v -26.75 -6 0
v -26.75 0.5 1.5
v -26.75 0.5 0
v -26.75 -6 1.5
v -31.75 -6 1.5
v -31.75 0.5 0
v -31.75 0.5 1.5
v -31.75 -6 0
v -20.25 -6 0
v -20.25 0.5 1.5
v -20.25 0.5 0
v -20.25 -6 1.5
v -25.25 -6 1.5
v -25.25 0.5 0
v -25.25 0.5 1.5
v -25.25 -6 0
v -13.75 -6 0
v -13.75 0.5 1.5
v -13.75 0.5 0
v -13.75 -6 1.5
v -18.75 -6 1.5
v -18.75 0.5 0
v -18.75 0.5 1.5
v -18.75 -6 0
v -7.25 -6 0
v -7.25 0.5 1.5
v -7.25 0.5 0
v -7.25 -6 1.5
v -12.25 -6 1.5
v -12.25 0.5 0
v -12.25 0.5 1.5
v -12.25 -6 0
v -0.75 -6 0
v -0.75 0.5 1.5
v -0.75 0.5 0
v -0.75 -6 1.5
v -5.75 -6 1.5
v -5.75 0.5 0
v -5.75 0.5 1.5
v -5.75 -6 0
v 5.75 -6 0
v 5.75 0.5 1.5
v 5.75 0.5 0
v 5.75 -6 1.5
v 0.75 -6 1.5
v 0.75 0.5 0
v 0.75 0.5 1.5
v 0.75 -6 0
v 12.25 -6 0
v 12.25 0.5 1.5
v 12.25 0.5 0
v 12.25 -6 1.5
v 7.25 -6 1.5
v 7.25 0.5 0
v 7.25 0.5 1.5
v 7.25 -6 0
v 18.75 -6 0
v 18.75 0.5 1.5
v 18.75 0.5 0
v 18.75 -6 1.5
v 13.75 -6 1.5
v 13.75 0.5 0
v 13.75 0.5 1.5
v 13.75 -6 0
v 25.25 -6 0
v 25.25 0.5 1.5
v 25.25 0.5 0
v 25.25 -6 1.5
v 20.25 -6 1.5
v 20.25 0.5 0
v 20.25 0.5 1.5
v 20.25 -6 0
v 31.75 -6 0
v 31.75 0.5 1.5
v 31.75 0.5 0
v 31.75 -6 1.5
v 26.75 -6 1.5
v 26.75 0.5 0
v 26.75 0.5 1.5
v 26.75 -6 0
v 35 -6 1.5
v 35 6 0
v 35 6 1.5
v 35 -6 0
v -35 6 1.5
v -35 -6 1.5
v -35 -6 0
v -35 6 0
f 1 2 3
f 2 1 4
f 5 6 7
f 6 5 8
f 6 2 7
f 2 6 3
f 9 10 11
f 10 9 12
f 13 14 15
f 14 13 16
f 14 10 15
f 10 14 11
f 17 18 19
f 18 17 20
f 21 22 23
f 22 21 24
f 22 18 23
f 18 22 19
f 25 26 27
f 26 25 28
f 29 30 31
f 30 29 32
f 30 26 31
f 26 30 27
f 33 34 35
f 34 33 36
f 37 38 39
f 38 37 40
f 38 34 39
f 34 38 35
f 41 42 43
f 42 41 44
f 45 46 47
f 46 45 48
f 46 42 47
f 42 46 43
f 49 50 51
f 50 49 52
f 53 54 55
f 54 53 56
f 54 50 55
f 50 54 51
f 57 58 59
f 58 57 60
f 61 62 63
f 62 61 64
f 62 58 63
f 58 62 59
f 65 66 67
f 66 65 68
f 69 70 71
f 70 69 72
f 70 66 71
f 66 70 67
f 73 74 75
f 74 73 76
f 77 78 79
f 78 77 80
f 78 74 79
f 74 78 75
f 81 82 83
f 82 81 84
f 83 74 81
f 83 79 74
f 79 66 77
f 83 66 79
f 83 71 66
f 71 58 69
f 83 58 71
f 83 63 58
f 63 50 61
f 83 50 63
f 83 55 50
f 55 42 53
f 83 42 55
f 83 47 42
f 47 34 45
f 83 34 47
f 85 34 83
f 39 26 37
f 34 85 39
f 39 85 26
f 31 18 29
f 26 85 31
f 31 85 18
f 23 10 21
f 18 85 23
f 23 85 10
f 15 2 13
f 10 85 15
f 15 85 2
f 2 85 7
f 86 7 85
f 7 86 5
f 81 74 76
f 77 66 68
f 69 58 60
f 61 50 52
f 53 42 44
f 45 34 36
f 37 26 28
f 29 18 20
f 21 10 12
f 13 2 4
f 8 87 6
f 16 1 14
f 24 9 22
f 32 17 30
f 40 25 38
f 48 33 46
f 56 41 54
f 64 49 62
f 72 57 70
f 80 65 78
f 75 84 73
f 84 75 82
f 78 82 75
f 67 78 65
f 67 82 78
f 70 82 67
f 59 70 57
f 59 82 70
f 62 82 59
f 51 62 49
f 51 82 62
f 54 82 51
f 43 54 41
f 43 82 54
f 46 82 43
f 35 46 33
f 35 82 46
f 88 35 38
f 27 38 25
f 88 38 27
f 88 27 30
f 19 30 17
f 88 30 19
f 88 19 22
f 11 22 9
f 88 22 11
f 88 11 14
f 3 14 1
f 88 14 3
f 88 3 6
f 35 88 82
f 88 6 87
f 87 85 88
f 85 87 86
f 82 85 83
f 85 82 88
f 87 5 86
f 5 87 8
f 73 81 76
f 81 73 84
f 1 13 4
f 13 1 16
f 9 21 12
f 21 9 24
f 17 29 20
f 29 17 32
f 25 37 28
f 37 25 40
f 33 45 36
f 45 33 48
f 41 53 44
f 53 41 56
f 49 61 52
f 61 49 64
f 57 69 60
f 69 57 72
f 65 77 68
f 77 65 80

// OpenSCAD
// 10-well agarose gel comb - printed lying flat
// Units: mm

plate_t     = 1.5;   // plate thickness (Z)
spine_len   = 70;    // spine length (X)
spine_w     = 12;    // spine width (Y)
teeth_n     = 10;    // number of teeth
teeth_w     = 5;     // tooth width (X)
teeth_l     = 12;    // tooth length (Y)
gap         = 1.5;   // gap between teeth (X)
eps         = 0.5;   // cutter overshoot past faces

$fn = 64;

pitch = teeth_w + gap;
x0    = -(teeth_n - 1) * pitch / 2;

difference() {
    // Spine
    translate([-spine_len / 2, -spine_w / 2, 0])
        cube([spine_len, spine_w, plate_t]);

    // Teeth
    for (i = [0 : teeth_n - 1])
        translate([x0 + i * pitch - teeth_w / 2, -teeth_l, -eps])
            cube([teeth_w, teeth_l + eps, plate_t + 2 * eps]);
}
